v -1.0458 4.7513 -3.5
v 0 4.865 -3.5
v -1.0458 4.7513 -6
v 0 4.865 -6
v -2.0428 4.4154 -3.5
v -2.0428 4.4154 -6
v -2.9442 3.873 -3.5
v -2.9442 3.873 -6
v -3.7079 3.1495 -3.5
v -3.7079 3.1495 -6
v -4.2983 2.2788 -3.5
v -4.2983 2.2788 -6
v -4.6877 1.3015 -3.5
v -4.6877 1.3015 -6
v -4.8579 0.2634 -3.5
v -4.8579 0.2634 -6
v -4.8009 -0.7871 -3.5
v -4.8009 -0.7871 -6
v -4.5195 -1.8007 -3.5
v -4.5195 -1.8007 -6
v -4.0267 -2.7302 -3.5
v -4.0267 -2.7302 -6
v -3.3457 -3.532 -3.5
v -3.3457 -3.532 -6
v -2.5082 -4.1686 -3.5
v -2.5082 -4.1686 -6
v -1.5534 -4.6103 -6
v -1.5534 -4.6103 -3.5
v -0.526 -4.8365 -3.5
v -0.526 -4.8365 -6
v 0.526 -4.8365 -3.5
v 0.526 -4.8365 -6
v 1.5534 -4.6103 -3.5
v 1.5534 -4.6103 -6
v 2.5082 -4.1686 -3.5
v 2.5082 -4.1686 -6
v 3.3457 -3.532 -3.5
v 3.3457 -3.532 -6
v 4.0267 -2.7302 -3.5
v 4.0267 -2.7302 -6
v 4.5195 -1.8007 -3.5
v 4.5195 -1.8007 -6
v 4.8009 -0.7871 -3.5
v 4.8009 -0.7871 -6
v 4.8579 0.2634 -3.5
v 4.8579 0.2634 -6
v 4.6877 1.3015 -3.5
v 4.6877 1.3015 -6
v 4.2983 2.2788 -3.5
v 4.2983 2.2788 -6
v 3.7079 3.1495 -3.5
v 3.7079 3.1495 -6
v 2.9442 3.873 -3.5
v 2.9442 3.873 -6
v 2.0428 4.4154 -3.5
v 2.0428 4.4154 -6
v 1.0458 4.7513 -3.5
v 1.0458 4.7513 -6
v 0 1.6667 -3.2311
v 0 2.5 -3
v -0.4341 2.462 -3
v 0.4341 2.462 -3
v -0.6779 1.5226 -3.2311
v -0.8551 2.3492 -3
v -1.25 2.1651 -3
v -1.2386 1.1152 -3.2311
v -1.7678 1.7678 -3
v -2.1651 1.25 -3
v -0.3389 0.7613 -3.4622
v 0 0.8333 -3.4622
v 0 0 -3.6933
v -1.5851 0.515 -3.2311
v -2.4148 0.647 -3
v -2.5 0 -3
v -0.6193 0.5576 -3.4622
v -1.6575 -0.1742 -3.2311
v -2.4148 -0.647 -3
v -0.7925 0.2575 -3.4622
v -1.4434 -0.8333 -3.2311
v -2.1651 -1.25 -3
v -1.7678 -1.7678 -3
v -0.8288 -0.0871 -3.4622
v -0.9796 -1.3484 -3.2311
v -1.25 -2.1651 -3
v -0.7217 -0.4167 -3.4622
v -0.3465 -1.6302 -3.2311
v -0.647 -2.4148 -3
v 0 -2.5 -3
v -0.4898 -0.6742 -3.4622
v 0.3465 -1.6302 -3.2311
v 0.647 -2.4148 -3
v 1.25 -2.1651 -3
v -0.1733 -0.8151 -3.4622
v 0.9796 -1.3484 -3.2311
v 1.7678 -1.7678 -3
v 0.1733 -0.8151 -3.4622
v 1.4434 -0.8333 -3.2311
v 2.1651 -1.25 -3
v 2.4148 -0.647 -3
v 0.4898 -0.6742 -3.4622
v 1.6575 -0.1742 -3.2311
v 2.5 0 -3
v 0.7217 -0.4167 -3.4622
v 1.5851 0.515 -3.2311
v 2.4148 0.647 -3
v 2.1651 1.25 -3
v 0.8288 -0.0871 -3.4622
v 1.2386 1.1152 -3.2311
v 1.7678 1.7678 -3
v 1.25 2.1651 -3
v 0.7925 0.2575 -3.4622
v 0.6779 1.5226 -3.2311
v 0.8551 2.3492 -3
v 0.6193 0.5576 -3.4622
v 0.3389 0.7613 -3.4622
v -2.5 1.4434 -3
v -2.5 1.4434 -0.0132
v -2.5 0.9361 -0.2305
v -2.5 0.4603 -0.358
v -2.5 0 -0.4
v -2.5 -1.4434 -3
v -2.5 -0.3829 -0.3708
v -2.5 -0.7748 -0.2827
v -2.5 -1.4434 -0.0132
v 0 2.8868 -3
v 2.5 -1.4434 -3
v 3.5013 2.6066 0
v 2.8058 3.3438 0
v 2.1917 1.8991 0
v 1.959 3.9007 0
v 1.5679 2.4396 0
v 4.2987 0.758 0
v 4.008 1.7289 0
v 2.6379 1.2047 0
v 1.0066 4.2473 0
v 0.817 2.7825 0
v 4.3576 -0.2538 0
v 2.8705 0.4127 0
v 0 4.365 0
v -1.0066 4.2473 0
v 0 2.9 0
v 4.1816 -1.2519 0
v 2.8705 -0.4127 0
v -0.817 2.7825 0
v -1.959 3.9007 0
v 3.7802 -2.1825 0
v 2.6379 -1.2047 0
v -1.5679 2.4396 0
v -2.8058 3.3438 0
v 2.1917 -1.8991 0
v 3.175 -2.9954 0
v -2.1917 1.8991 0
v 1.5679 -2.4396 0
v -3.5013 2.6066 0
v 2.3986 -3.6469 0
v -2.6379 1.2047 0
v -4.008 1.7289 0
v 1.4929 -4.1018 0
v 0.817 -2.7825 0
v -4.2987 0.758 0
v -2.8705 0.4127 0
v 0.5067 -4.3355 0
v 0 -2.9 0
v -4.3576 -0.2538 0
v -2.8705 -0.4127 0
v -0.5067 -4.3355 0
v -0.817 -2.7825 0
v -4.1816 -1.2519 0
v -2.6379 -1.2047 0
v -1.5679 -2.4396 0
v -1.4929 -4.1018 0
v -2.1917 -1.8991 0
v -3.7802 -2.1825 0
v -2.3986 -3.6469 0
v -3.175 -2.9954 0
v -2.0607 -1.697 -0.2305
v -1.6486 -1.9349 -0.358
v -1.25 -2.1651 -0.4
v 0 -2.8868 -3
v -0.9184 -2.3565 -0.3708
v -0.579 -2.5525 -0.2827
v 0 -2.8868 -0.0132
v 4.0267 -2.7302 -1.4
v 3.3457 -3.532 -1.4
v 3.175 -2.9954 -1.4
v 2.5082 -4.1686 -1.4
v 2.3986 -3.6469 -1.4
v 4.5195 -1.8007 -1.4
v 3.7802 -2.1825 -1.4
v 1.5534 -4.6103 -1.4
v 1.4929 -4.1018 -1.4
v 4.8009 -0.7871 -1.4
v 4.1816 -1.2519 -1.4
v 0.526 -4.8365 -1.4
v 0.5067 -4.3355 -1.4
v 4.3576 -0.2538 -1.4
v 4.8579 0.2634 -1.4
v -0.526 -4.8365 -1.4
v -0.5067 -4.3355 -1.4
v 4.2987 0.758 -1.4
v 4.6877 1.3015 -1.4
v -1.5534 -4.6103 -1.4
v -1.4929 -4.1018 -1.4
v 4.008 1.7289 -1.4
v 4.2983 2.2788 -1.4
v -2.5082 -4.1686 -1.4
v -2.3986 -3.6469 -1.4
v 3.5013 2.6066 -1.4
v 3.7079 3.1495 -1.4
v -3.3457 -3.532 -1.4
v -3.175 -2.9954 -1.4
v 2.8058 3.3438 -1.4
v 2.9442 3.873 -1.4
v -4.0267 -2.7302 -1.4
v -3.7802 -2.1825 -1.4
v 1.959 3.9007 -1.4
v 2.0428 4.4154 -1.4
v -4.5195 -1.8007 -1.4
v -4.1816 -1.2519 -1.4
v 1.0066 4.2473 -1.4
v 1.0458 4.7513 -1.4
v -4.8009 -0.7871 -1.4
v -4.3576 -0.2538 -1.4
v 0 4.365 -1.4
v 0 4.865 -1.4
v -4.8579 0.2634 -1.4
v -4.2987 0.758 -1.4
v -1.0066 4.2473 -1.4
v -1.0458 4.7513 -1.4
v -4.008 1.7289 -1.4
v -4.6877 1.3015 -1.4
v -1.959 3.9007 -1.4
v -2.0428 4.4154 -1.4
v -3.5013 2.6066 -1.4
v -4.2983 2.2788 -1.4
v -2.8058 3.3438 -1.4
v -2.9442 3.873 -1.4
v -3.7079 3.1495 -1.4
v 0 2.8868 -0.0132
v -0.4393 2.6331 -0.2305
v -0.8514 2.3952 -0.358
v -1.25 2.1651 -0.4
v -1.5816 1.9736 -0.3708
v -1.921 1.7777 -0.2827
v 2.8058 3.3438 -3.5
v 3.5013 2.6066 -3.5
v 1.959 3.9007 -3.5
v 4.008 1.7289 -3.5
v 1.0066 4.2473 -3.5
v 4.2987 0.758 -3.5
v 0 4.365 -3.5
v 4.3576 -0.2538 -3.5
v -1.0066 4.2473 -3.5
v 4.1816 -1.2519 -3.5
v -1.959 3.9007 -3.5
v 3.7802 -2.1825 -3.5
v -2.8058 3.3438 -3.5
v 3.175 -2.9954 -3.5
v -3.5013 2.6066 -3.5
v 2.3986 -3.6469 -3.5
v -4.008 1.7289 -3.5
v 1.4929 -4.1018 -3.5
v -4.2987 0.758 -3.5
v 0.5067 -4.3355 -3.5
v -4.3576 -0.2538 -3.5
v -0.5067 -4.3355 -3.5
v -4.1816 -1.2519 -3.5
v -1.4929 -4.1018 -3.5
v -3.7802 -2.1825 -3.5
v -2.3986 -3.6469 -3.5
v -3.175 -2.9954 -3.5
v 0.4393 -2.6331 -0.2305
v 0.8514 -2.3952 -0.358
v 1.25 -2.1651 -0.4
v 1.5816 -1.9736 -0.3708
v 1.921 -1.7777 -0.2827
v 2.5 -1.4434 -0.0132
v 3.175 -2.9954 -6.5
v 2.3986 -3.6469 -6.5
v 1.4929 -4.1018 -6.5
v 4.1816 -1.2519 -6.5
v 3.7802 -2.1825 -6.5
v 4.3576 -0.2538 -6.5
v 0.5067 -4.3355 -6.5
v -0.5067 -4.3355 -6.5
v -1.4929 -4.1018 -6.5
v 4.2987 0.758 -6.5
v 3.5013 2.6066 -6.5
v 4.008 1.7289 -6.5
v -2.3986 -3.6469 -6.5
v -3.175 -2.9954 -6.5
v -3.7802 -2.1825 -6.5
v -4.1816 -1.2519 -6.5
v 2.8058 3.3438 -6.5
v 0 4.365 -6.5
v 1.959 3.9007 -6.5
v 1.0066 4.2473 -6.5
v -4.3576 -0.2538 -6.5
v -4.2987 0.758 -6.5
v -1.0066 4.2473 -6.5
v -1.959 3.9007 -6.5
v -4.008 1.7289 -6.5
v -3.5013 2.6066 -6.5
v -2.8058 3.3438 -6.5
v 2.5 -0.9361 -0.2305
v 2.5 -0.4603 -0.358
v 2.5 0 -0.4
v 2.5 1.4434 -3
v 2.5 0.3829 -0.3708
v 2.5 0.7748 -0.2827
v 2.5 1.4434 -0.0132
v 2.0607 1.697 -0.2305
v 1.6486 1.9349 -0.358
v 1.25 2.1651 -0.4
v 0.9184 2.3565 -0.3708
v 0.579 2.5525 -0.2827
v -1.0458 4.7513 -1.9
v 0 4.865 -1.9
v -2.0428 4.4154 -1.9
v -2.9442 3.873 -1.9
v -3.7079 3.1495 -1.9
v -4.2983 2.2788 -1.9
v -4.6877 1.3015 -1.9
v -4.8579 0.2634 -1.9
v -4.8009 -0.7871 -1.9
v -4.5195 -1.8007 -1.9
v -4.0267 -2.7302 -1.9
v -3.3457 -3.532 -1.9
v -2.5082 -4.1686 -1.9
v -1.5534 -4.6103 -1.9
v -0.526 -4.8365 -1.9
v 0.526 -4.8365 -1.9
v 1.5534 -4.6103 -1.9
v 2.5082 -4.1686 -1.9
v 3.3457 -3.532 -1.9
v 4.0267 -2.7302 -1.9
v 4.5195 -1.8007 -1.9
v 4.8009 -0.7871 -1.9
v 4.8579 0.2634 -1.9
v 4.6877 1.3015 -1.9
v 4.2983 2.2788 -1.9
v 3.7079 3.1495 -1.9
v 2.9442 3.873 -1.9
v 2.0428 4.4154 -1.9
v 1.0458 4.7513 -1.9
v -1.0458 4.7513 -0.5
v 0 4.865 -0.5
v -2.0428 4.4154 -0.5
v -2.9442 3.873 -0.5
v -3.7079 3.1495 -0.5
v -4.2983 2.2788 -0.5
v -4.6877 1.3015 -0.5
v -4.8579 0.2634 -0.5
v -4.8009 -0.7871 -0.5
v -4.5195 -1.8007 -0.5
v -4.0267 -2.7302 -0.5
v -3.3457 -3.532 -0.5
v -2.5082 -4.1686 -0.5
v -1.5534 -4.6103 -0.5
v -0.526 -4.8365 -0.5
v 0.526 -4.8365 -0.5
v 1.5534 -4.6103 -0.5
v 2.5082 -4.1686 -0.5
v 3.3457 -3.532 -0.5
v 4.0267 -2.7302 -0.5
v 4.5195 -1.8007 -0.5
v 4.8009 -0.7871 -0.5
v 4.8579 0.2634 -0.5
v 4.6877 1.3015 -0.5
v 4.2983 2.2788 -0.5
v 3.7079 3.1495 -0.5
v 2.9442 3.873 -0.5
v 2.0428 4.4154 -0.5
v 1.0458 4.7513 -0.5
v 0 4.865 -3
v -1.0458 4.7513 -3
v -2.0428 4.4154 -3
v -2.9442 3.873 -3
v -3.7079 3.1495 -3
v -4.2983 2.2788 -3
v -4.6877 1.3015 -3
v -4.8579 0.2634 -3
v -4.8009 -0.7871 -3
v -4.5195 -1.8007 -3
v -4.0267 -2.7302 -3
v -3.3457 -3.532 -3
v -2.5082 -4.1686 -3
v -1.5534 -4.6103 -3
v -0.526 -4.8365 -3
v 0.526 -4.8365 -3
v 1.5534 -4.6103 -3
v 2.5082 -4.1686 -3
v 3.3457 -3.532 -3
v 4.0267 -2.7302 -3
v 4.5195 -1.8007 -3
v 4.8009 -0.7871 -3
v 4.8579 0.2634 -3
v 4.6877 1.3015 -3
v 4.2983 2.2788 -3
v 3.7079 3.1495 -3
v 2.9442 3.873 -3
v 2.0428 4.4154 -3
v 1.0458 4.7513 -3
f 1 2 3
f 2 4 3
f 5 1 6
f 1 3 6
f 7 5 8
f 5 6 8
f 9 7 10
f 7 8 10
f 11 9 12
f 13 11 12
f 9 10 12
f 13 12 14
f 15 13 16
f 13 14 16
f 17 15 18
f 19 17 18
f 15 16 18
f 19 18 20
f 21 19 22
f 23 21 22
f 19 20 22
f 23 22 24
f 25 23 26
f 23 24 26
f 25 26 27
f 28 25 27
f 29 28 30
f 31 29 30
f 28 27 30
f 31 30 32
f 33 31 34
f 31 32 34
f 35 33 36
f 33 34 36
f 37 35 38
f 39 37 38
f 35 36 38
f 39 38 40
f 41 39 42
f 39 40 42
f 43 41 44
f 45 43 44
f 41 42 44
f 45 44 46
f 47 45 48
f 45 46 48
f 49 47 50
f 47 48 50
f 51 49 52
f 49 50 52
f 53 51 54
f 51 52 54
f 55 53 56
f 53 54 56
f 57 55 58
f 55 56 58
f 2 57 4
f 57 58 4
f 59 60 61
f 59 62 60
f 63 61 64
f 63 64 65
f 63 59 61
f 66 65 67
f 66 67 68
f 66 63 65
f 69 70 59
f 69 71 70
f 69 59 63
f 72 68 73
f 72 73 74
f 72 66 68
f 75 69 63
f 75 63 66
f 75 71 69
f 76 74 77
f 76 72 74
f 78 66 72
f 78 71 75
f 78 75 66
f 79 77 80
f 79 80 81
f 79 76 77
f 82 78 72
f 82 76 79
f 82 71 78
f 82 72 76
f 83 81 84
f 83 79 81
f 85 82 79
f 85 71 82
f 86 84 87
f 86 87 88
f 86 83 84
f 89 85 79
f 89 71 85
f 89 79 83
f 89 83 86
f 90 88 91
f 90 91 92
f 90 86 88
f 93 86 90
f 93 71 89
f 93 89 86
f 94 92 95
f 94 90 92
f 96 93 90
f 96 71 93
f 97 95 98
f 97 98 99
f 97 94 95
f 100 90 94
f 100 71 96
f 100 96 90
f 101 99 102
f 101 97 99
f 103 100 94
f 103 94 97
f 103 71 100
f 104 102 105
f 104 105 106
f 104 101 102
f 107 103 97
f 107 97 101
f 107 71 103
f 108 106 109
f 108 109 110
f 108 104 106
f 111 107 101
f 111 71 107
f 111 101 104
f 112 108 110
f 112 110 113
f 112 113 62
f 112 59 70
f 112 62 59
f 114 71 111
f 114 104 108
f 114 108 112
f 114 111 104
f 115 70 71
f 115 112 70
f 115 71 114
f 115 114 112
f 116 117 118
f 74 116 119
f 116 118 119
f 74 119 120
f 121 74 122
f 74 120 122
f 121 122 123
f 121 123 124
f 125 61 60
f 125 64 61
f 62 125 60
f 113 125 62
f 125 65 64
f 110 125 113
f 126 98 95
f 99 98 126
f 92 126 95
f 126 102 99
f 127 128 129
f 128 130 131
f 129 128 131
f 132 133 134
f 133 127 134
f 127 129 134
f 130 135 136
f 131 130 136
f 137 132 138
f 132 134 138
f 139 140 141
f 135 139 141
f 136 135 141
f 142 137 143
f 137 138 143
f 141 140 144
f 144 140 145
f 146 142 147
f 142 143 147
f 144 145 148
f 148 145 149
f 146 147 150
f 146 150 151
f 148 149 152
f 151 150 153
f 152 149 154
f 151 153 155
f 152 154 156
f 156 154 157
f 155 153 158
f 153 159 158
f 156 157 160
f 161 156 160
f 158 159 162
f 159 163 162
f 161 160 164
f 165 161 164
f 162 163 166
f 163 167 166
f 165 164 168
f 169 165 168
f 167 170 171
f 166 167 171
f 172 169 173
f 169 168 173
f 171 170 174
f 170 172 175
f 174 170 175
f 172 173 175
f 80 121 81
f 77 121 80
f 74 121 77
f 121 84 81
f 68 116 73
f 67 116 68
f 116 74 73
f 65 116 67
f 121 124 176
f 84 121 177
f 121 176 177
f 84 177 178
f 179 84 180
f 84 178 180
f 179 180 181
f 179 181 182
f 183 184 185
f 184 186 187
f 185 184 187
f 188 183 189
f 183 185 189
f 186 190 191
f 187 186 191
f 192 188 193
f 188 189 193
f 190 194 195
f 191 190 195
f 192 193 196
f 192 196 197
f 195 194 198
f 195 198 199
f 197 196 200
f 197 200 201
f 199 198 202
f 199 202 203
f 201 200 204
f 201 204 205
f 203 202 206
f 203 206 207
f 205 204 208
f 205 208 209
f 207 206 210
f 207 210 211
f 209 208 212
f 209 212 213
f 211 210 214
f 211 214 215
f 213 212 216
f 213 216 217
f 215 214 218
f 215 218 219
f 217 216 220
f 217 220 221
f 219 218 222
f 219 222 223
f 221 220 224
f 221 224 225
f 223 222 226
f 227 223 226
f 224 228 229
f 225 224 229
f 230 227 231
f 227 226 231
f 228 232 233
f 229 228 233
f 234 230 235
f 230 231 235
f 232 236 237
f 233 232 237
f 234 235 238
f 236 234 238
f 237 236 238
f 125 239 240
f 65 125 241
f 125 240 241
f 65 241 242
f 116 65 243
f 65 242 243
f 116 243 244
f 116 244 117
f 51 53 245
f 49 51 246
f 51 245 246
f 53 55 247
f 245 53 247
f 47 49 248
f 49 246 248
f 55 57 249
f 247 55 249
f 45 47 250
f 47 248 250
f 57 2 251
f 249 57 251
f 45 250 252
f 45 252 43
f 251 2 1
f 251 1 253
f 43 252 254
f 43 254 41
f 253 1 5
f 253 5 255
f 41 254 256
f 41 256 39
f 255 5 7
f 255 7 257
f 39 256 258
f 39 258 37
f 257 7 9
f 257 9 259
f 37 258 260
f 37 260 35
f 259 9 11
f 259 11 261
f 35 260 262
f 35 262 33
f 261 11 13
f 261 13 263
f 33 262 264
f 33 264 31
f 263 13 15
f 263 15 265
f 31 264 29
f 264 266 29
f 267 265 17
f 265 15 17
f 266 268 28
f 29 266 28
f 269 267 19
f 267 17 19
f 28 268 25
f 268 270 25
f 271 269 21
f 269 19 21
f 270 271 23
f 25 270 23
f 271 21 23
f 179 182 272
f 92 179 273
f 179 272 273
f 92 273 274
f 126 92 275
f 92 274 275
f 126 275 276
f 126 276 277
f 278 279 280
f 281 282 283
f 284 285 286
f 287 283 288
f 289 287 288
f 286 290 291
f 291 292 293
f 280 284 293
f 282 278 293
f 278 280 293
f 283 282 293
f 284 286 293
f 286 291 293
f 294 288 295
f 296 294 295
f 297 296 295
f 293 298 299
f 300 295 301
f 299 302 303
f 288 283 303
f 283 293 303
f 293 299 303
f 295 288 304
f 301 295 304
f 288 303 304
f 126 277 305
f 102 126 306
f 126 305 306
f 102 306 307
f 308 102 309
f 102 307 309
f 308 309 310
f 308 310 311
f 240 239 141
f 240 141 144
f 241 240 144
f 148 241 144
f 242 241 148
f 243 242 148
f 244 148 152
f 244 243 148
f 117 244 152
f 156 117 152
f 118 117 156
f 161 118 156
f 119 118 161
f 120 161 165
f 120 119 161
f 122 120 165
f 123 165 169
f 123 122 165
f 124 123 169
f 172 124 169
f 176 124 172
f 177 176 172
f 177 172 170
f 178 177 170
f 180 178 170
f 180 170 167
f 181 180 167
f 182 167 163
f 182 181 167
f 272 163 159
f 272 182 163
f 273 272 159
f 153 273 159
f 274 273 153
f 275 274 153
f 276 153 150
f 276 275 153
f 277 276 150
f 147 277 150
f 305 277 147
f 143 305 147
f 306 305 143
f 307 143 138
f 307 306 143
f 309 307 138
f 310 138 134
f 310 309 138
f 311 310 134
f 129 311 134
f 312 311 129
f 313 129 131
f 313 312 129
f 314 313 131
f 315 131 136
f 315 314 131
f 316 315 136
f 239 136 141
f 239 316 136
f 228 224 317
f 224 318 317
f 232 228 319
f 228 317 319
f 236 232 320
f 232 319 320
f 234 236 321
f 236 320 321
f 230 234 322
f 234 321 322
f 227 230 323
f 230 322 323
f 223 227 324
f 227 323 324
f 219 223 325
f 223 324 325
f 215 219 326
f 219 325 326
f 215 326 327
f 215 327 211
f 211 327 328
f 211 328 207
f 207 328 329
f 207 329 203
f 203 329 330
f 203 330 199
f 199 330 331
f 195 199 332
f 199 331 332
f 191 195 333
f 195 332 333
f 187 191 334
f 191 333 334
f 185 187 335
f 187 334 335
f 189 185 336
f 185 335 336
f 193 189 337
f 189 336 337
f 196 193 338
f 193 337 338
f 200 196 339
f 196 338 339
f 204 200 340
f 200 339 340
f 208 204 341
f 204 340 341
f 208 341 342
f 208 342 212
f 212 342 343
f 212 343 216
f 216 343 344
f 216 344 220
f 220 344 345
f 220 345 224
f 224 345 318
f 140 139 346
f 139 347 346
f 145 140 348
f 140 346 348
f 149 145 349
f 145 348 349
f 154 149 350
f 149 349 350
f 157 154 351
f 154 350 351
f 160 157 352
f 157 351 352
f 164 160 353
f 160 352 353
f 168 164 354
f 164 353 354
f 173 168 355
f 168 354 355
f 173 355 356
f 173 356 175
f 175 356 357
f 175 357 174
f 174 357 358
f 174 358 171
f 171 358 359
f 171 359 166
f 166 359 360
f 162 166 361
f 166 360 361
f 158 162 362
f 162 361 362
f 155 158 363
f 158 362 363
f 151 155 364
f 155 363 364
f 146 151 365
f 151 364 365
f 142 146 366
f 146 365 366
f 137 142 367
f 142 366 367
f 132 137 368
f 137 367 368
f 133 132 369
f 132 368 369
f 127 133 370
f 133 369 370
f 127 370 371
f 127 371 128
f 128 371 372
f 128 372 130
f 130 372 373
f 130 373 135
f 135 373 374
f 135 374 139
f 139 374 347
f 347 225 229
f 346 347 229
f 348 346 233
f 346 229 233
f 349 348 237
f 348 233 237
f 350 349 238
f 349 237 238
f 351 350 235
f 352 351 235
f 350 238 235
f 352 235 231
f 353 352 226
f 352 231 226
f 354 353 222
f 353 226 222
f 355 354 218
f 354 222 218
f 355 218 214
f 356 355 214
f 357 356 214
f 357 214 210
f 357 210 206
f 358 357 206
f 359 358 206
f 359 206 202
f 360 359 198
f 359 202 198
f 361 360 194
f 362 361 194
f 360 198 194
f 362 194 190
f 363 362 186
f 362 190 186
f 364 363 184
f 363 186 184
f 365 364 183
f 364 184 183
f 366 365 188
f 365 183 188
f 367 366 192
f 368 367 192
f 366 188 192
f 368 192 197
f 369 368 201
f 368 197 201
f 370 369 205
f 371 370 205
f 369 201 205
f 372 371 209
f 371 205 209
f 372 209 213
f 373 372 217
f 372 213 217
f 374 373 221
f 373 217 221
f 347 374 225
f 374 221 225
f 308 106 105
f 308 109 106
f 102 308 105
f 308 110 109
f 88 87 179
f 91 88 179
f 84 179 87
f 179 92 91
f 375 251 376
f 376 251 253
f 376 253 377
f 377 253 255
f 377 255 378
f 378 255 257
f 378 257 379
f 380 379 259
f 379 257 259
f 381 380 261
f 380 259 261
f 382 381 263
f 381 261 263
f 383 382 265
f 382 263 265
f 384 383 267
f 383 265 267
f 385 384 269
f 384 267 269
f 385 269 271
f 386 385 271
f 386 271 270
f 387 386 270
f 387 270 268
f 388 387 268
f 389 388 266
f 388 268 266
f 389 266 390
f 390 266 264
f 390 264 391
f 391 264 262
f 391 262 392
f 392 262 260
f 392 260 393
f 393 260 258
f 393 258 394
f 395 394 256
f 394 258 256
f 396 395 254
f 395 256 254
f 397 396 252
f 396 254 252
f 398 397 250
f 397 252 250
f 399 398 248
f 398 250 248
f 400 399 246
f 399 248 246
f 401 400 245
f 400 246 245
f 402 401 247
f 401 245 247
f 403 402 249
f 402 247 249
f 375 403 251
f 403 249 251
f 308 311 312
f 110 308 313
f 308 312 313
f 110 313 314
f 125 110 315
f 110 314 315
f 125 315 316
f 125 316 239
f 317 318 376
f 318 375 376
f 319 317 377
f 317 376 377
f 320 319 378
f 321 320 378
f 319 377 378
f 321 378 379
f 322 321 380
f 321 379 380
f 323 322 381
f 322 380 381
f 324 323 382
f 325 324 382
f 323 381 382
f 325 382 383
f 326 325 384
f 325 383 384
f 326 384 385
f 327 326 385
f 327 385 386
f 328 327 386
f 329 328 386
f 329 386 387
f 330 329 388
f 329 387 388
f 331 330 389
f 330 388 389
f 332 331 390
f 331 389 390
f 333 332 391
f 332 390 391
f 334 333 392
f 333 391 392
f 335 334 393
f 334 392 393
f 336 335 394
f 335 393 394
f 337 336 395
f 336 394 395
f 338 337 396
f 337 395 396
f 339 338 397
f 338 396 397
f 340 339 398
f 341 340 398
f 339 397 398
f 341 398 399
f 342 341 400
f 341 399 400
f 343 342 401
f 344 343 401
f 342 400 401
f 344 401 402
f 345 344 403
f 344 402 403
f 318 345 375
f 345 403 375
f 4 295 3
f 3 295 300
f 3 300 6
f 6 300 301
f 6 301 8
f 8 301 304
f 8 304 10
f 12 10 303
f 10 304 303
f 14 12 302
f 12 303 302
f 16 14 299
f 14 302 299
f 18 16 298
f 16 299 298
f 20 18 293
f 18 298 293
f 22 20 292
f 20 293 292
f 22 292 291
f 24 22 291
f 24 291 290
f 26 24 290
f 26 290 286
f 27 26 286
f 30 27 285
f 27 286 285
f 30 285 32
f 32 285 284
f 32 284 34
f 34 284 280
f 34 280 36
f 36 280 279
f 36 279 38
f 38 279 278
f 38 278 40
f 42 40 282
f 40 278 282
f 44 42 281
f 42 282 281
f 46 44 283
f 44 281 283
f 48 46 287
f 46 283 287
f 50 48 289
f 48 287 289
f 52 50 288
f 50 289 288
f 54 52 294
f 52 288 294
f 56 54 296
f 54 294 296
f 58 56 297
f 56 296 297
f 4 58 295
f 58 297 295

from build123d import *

# Parameters (mm, degrees)
CUT_EXTRUDE1_DEPTH = 3


with BuildPart() as part:
    # Sketch1 → Revolve1 (revolve)
    with BuildSketch(Plane(origin=(0, 0, 0), x_dir=(0, 0, -1), z_dir=(1, 0, 0))):
        Polygon((0, 0), (0, 4.365), (0.5, 4.865), (6, 4.865), (6.5, 4.365), (6.5, 0), align=None)
    revolve(axis=Axis((0, 0, -6.5), (0, 0, 1)))

    # Sketch2 → Cut-Revolve1 (revolve, cut)
    with BuildSketch(Plane(origin=(0, 0, 0), x_dir=(0, 0, -1), z_dir=(1, 0, 0))):
        Polygon((0, 4.865), (1.4, 4.865), (1.4, 4.365), (1.9, 4.865), (3, 4.865), (3.5, 4.365), (3.5, 4.865), (6.5, 4.865), (6.5, 9.865), (0, 9.865), align=None)
    revolve(axis=Axis((0, 0, -6.5), (0, 0, 1)), mode=Mode.SUBTRACT)

    # Sketch3 → Cut-Revolve2 (revolve, cut)
    with BuildSketch(Plane(origin=(0, 0, 0), x_dir=(0, 0, -1), z_dir=(1, 0, 0))):
        Polygon((0, 0), (0, 2.9), (0.4, 2.5), (3, 2.5), (3.69331136, 0), align=None)
    revolve(axis=Axis((0, 0, -3.69331136), (0, 0, 1)), mode=Mode.SUBTRACT)

    # Sketch4 → Cut-Extrude1 (cut)
    with BuildSketch(Plane.XY):
        Polygon((-2.5, -1.443375673), (0, -2.886751346), (2.5, -1.443375673), (2.5, 1.443375673), (0, 2.886751346), (-2.5, 1.443375673), align=None)
    extrude(amount=-CUT_EXTRUDE1_DEPTH, mode=Mode.SUBTRACT)


solid = part.part
